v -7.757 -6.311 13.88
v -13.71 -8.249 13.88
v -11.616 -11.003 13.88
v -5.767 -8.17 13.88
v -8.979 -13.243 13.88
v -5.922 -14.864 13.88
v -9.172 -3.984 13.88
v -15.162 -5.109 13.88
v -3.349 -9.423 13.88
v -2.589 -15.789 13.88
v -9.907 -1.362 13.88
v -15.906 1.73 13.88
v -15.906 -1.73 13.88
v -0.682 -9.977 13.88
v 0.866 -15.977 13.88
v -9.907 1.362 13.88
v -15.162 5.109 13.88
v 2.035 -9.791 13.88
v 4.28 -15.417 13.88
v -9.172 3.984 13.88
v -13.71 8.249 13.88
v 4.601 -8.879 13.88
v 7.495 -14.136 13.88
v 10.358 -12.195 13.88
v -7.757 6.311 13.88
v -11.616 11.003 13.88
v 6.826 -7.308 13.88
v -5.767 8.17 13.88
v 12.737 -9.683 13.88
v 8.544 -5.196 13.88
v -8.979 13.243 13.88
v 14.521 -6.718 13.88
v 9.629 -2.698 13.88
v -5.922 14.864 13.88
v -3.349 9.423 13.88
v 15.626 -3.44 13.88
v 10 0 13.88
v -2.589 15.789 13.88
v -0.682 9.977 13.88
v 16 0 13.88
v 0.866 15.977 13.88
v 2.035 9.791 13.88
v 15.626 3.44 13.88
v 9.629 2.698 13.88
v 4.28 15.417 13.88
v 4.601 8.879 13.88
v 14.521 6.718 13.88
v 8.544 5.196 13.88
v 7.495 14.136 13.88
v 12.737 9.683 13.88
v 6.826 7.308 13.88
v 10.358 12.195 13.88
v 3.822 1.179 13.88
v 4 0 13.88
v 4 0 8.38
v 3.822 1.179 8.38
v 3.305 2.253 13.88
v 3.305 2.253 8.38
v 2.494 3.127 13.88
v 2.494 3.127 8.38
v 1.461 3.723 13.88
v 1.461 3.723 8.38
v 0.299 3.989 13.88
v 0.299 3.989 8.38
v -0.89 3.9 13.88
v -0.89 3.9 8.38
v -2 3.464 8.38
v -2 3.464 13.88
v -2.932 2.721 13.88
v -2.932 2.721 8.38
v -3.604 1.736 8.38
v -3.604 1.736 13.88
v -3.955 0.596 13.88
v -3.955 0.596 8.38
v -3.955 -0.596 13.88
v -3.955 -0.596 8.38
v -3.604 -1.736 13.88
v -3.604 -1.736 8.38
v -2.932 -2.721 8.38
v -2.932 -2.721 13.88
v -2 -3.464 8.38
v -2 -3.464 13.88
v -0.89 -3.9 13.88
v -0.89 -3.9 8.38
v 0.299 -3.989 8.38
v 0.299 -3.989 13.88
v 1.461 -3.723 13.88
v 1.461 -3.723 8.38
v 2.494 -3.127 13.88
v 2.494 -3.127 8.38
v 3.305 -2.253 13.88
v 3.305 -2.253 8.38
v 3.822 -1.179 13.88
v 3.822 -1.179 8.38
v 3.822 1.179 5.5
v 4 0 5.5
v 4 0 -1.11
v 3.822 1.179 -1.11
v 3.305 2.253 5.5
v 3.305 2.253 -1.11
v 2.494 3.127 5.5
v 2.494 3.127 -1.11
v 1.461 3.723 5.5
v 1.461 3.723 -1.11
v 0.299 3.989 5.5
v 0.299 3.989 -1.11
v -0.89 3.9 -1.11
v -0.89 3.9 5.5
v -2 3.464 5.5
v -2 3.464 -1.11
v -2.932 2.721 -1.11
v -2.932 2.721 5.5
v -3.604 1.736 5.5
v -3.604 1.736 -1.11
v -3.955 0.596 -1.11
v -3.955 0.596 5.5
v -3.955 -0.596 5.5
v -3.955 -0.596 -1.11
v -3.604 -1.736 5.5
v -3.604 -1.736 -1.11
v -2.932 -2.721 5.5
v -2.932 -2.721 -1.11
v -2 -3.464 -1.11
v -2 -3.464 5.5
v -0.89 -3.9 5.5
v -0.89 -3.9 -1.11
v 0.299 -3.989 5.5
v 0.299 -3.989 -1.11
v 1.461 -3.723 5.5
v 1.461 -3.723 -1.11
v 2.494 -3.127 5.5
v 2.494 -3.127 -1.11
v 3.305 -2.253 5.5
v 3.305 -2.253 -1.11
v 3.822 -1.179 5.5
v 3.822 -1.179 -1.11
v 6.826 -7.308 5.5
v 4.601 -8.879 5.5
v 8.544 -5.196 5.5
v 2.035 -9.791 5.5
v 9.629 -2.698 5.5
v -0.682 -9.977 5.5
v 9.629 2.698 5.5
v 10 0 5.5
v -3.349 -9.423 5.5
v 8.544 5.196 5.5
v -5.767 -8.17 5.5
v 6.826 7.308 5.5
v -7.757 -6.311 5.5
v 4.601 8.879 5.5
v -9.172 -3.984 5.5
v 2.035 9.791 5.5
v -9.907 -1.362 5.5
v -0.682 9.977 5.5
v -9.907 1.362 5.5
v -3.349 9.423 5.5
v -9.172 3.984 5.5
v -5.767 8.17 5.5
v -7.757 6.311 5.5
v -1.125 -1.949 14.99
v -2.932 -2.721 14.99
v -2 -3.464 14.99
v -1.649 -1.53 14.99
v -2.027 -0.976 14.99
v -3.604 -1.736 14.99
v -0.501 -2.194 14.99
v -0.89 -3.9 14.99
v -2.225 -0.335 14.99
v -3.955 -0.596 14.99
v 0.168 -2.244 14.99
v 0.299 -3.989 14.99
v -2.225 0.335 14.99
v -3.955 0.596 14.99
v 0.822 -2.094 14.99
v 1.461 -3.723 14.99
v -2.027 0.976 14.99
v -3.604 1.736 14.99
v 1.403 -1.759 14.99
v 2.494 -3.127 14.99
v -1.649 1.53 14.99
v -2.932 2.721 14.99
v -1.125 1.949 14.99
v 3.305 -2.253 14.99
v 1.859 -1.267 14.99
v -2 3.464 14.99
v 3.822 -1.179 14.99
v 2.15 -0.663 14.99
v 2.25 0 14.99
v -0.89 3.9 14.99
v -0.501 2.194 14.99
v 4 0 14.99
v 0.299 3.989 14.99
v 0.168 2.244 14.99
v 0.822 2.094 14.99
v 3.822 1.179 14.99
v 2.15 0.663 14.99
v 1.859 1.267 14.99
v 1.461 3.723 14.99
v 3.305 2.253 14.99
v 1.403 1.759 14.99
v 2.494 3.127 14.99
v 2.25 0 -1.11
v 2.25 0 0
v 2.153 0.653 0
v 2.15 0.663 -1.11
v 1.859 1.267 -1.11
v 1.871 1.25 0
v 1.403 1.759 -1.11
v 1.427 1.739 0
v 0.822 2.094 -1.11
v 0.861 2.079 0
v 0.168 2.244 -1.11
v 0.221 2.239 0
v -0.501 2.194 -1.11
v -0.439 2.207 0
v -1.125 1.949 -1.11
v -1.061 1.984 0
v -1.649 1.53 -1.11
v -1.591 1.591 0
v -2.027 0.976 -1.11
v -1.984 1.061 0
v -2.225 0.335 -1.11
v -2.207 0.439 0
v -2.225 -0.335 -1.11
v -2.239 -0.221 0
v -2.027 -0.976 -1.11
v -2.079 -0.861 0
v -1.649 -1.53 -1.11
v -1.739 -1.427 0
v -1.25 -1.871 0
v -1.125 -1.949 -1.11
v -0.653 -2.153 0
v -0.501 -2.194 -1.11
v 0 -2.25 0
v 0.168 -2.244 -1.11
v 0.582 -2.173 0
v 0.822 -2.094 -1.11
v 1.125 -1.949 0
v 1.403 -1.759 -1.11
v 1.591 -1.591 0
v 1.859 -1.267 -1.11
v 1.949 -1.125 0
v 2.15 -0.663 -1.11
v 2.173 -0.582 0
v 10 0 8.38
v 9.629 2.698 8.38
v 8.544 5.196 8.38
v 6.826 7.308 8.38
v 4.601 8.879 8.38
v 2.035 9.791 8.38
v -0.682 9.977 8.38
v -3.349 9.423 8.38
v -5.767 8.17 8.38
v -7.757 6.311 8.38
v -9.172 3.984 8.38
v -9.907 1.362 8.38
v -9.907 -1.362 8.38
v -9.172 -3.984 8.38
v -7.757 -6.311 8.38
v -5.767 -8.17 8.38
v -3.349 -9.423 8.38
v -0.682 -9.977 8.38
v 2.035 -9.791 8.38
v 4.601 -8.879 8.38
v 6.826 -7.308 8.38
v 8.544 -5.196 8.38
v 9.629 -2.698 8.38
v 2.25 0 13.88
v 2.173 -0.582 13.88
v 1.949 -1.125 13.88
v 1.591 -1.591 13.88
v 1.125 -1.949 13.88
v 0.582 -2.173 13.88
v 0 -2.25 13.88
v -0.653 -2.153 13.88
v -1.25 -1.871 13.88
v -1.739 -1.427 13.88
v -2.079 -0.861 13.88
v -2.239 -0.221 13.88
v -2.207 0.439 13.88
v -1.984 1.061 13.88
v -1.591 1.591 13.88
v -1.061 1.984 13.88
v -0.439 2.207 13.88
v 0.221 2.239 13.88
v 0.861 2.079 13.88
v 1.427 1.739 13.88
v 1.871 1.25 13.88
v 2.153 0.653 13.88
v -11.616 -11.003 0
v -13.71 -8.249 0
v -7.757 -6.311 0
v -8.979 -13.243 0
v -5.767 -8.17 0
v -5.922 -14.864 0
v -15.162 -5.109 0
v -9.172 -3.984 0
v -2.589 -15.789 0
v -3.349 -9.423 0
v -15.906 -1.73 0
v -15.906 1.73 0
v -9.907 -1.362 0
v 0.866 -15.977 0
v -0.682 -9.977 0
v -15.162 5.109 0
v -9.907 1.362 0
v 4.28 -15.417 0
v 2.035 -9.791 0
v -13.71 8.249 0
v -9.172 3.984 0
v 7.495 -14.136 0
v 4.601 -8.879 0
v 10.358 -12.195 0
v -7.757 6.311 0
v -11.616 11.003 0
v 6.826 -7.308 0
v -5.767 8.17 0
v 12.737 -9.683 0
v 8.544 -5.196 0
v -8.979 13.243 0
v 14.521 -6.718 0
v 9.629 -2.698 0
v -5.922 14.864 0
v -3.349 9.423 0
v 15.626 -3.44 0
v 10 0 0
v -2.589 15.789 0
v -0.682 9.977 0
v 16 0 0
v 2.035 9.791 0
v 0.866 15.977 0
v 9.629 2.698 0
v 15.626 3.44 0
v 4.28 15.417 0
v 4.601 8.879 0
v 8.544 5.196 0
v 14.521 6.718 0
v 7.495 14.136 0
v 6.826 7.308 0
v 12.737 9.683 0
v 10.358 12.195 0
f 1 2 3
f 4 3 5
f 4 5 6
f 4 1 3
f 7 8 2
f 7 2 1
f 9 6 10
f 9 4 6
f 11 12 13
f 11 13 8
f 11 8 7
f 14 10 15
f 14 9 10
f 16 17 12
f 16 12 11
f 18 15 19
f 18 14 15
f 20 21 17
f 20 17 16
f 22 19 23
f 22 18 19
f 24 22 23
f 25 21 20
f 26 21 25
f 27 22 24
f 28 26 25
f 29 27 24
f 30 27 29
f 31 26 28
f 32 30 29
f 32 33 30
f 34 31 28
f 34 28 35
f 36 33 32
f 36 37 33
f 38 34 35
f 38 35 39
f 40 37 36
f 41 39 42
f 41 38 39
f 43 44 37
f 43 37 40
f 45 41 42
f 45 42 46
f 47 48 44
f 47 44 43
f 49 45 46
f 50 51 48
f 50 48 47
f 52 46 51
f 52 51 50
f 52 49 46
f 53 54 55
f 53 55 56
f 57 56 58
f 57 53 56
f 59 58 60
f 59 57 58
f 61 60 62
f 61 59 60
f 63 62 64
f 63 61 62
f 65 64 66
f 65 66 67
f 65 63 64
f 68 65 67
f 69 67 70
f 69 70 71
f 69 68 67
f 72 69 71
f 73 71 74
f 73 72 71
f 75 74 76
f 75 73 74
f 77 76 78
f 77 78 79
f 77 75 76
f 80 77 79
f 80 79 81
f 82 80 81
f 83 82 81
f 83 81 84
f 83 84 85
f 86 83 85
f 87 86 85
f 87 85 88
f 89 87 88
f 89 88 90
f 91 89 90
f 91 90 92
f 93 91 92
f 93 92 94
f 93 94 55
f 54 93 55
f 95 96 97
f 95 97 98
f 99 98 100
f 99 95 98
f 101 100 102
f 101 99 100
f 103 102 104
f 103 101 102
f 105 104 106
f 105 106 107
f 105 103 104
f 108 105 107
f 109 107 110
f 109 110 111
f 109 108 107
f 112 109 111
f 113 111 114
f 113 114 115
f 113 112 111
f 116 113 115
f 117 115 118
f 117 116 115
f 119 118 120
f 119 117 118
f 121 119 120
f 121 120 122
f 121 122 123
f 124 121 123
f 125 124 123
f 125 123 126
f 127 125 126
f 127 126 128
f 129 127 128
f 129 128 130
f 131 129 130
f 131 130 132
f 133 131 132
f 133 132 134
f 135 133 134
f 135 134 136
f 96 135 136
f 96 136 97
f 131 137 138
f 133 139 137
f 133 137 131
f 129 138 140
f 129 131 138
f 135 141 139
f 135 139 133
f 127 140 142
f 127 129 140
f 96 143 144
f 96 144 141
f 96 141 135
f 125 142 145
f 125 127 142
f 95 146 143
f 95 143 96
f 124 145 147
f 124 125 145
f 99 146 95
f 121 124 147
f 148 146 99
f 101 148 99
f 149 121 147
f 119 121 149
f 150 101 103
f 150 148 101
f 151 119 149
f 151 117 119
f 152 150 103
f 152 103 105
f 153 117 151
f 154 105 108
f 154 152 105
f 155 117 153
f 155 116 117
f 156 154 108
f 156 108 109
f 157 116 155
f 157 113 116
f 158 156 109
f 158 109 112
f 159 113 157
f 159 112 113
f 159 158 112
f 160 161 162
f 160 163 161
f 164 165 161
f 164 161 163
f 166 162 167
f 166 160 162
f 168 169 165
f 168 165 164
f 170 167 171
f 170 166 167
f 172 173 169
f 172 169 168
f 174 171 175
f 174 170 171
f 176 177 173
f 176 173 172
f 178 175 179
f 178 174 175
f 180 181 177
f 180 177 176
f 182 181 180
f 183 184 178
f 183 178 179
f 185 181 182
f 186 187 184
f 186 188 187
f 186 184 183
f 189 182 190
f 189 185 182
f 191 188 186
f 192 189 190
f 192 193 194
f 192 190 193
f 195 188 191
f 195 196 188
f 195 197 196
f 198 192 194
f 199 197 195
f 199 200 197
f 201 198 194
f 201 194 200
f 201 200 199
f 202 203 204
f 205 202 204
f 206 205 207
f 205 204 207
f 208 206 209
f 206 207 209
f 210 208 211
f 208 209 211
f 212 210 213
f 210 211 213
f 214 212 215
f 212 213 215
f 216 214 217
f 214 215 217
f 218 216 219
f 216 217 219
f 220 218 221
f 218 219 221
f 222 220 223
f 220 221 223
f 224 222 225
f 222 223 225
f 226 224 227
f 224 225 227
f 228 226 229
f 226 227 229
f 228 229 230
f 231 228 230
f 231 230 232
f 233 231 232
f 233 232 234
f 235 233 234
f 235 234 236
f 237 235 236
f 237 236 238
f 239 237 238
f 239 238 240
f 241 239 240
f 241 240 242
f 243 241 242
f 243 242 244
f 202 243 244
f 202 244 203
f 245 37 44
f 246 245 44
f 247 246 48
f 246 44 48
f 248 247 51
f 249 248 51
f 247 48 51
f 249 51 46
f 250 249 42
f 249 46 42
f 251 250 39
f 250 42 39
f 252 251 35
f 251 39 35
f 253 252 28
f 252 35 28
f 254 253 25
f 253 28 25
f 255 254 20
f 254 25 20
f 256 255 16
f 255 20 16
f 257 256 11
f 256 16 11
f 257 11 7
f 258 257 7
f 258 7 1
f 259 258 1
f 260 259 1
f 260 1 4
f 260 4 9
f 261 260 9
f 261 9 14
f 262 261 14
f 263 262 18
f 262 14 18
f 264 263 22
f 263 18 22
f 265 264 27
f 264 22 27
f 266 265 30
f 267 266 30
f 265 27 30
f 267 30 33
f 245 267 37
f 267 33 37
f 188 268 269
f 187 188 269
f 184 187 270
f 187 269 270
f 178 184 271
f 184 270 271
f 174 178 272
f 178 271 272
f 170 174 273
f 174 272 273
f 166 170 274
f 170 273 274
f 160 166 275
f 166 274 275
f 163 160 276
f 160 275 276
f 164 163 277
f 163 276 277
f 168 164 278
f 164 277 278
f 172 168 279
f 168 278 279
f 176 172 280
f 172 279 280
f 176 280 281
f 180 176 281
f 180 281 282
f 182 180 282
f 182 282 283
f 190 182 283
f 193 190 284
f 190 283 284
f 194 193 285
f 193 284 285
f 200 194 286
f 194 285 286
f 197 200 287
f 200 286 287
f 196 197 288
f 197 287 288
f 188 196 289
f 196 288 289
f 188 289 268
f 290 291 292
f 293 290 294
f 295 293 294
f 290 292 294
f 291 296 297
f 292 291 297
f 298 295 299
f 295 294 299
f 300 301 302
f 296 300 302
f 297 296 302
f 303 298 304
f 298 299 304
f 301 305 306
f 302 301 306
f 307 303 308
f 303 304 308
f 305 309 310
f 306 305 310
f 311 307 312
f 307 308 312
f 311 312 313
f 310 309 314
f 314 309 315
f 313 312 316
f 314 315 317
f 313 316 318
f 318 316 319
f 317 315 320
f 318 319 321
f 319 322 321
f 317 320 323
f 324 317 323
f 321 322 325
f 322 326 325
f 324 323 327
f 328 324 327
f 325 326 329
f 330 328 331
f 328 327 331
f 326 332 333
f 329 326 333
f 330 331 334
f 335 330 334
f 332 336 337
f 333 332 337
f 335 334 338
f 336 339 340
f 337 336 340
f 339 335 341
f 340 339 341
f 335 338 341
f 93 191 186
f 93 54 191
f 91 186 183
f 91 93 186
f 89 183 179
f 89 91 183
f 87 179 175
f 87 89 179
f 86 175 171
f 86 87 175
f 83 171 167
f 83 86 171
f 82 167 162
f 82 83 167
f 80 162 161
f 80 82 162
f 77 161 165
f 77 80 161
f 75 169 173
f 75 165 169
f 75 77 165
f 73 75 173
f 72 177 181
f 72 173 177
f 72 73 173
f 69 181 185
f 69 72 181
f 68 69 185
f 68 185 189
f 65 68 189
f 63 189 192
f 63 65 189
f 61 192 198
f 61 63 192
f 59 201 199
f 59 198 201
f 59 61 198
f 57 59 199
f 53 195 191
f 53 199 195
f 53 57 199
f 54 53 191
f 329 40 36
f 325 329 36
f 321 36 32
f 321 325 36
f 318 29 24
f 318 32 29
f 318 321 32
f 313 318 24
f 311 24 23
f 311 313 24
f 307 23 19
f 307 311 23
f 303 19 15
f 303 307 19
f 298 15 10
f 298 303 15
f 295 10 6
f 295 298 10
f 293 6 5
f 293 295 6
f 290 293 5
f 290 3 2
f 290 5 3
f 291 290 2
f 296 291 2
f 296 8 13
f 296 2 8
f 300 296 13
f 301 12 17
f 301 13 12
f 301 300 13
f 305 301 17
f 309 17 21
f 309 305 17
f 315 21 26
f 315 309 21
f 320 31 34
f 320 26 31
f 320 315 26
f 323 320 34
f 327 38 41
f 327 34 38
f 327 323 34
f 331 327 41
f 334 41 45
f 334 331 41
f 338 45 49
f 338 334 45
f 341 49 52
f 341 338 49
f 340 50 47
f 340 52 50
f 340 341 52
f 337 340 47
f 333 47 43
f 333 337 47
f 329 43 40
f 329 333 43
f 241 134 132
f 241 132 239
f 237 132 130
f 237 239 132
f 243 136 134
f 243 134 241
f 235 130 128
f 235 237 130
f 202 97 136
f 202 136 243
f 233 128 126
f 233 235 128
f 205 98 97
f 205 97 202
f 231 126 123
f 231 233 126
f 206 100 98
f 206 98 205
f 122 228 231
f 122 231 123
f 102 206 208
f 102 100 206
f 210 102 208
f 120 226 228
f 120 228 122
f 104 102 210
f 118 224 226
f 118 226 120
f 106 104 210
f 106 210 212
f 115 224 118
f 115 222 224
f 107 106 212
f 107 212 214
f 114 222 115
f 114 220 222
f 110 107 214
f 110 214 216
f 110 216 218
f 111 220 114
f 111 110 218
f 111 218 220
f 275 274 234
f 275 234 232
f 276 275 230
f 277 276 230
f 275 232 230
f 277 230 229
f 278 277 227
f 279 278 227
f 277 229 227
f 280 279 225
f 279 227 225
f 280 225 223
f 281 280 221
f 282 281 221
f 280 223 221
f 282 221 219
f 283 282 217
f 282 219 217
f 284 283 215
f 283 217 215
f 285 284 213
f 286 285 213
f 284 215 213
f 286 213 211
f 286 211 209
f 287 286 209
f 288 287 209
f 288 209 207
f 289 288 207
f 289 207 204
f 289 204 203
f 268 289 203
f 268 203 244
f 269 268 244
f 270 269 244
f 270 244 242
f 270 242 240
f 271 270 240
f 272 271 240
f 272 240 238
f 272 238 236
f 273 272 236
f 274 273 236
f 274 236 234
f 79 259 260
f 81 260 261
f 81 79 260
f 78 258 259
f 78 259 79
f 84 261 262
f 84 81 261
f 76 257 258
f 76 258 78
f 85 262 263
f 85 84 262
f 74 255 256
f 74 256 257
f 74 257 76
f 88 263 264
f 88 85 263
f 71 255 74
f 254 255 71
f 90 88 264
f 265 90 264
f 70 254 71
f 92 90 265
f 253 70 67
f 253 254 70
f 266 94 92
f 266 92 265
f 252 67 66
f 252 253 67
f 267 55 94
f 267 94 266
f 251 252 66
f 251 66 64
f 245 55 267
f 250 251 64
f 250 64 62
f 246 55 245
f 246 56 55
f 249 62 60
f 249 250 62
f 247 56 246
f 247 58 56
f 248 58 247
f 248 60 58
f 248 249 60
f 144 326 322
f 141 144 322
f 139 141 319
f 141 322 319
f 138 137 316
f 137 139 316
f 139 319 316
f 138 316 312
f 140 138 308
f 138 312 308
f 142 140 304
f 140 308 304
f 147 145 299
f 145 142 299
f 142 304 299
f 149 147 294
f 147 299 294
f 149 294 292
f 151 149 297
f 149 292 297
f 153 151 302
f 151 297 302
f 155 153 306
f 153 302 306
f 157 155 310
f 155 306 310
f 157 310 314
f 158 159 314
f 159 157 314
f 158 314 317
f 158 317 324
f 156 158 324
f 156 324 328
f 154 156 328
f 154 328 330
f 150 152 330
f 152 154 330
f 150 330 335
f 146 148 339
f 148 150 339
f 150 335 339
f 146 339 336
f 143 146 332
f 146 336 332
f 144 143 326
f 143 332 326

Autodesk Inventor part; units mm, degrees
ref_plane "YZ Plane" through (0, 0, 0) normal (1, 0, 0) x (0, 1, 0)
ref_plane "XZ Plane" through (0, 0, 0) normal (0, 1, 0) x (-1, 0, 0)
ref_plane "XY Plane" through (0, 0, 0) normal (0, 0, 1) x (1, 0, 0)
sketch "スケッチ1" plane through (0, 0, 0) normal (0, 0, 1) x (1, 0, 0)
  circle A0 centre (0, 0) radius 16
  dimension "d0" = 32
extrude "押し出し1" add sketch "スケッチ1" along normal blind 13.88
sketch "スケッチ2" plane through (0, 0, 13.88) normal (0, 0, 1) x (1, 0, 0)
  circle A0 centre (0, 0) radius 16 projected
  circle A1 centre (0, 0) radius 10
  circle A2 centre (0, 0) radius 4
  dimension "d3" = 6
  dimension "d4" = 6
extrude "押し出し2" cut sketch "スケッチ2" against normal blind 5.5 contours A1
ref_plane "作業平面1" through (0, 0, 6.94) normal (0, 0, 1) x (1, 0, 0)
mirror "ミラー1" about plane through (0, 0, 6.94) normal (0, 0, 1) of "押し出し2"
sketch "スケッチ3" plane through (0, 0, 13.88) normal (0, 0, 1) x (1, 0, 0)
  point P0 (0, 0)
  point P1 (0, 0)
hole "穴1" at (0, 0, 13.88) direction (0, 0, -1) diameter 4.5 depth 13.88
sketch "スケッチ4" plane through (0, 0, 13.88) normal (0, 0, 1) x (1, 0, 0)
  circle A0 centre (0, 0) radius 2.25 projected
  circle A1 centre (0, 0) radius 4 projected
extrude "押し出し3" add sketch "スケッチ4" along normal blind 1.11
mirror "ミラー2" about plane through (0, 0, 6.94) normal (0, 0, 1) of "押し出し3"
properties part number "wheel" material "ゴム"
